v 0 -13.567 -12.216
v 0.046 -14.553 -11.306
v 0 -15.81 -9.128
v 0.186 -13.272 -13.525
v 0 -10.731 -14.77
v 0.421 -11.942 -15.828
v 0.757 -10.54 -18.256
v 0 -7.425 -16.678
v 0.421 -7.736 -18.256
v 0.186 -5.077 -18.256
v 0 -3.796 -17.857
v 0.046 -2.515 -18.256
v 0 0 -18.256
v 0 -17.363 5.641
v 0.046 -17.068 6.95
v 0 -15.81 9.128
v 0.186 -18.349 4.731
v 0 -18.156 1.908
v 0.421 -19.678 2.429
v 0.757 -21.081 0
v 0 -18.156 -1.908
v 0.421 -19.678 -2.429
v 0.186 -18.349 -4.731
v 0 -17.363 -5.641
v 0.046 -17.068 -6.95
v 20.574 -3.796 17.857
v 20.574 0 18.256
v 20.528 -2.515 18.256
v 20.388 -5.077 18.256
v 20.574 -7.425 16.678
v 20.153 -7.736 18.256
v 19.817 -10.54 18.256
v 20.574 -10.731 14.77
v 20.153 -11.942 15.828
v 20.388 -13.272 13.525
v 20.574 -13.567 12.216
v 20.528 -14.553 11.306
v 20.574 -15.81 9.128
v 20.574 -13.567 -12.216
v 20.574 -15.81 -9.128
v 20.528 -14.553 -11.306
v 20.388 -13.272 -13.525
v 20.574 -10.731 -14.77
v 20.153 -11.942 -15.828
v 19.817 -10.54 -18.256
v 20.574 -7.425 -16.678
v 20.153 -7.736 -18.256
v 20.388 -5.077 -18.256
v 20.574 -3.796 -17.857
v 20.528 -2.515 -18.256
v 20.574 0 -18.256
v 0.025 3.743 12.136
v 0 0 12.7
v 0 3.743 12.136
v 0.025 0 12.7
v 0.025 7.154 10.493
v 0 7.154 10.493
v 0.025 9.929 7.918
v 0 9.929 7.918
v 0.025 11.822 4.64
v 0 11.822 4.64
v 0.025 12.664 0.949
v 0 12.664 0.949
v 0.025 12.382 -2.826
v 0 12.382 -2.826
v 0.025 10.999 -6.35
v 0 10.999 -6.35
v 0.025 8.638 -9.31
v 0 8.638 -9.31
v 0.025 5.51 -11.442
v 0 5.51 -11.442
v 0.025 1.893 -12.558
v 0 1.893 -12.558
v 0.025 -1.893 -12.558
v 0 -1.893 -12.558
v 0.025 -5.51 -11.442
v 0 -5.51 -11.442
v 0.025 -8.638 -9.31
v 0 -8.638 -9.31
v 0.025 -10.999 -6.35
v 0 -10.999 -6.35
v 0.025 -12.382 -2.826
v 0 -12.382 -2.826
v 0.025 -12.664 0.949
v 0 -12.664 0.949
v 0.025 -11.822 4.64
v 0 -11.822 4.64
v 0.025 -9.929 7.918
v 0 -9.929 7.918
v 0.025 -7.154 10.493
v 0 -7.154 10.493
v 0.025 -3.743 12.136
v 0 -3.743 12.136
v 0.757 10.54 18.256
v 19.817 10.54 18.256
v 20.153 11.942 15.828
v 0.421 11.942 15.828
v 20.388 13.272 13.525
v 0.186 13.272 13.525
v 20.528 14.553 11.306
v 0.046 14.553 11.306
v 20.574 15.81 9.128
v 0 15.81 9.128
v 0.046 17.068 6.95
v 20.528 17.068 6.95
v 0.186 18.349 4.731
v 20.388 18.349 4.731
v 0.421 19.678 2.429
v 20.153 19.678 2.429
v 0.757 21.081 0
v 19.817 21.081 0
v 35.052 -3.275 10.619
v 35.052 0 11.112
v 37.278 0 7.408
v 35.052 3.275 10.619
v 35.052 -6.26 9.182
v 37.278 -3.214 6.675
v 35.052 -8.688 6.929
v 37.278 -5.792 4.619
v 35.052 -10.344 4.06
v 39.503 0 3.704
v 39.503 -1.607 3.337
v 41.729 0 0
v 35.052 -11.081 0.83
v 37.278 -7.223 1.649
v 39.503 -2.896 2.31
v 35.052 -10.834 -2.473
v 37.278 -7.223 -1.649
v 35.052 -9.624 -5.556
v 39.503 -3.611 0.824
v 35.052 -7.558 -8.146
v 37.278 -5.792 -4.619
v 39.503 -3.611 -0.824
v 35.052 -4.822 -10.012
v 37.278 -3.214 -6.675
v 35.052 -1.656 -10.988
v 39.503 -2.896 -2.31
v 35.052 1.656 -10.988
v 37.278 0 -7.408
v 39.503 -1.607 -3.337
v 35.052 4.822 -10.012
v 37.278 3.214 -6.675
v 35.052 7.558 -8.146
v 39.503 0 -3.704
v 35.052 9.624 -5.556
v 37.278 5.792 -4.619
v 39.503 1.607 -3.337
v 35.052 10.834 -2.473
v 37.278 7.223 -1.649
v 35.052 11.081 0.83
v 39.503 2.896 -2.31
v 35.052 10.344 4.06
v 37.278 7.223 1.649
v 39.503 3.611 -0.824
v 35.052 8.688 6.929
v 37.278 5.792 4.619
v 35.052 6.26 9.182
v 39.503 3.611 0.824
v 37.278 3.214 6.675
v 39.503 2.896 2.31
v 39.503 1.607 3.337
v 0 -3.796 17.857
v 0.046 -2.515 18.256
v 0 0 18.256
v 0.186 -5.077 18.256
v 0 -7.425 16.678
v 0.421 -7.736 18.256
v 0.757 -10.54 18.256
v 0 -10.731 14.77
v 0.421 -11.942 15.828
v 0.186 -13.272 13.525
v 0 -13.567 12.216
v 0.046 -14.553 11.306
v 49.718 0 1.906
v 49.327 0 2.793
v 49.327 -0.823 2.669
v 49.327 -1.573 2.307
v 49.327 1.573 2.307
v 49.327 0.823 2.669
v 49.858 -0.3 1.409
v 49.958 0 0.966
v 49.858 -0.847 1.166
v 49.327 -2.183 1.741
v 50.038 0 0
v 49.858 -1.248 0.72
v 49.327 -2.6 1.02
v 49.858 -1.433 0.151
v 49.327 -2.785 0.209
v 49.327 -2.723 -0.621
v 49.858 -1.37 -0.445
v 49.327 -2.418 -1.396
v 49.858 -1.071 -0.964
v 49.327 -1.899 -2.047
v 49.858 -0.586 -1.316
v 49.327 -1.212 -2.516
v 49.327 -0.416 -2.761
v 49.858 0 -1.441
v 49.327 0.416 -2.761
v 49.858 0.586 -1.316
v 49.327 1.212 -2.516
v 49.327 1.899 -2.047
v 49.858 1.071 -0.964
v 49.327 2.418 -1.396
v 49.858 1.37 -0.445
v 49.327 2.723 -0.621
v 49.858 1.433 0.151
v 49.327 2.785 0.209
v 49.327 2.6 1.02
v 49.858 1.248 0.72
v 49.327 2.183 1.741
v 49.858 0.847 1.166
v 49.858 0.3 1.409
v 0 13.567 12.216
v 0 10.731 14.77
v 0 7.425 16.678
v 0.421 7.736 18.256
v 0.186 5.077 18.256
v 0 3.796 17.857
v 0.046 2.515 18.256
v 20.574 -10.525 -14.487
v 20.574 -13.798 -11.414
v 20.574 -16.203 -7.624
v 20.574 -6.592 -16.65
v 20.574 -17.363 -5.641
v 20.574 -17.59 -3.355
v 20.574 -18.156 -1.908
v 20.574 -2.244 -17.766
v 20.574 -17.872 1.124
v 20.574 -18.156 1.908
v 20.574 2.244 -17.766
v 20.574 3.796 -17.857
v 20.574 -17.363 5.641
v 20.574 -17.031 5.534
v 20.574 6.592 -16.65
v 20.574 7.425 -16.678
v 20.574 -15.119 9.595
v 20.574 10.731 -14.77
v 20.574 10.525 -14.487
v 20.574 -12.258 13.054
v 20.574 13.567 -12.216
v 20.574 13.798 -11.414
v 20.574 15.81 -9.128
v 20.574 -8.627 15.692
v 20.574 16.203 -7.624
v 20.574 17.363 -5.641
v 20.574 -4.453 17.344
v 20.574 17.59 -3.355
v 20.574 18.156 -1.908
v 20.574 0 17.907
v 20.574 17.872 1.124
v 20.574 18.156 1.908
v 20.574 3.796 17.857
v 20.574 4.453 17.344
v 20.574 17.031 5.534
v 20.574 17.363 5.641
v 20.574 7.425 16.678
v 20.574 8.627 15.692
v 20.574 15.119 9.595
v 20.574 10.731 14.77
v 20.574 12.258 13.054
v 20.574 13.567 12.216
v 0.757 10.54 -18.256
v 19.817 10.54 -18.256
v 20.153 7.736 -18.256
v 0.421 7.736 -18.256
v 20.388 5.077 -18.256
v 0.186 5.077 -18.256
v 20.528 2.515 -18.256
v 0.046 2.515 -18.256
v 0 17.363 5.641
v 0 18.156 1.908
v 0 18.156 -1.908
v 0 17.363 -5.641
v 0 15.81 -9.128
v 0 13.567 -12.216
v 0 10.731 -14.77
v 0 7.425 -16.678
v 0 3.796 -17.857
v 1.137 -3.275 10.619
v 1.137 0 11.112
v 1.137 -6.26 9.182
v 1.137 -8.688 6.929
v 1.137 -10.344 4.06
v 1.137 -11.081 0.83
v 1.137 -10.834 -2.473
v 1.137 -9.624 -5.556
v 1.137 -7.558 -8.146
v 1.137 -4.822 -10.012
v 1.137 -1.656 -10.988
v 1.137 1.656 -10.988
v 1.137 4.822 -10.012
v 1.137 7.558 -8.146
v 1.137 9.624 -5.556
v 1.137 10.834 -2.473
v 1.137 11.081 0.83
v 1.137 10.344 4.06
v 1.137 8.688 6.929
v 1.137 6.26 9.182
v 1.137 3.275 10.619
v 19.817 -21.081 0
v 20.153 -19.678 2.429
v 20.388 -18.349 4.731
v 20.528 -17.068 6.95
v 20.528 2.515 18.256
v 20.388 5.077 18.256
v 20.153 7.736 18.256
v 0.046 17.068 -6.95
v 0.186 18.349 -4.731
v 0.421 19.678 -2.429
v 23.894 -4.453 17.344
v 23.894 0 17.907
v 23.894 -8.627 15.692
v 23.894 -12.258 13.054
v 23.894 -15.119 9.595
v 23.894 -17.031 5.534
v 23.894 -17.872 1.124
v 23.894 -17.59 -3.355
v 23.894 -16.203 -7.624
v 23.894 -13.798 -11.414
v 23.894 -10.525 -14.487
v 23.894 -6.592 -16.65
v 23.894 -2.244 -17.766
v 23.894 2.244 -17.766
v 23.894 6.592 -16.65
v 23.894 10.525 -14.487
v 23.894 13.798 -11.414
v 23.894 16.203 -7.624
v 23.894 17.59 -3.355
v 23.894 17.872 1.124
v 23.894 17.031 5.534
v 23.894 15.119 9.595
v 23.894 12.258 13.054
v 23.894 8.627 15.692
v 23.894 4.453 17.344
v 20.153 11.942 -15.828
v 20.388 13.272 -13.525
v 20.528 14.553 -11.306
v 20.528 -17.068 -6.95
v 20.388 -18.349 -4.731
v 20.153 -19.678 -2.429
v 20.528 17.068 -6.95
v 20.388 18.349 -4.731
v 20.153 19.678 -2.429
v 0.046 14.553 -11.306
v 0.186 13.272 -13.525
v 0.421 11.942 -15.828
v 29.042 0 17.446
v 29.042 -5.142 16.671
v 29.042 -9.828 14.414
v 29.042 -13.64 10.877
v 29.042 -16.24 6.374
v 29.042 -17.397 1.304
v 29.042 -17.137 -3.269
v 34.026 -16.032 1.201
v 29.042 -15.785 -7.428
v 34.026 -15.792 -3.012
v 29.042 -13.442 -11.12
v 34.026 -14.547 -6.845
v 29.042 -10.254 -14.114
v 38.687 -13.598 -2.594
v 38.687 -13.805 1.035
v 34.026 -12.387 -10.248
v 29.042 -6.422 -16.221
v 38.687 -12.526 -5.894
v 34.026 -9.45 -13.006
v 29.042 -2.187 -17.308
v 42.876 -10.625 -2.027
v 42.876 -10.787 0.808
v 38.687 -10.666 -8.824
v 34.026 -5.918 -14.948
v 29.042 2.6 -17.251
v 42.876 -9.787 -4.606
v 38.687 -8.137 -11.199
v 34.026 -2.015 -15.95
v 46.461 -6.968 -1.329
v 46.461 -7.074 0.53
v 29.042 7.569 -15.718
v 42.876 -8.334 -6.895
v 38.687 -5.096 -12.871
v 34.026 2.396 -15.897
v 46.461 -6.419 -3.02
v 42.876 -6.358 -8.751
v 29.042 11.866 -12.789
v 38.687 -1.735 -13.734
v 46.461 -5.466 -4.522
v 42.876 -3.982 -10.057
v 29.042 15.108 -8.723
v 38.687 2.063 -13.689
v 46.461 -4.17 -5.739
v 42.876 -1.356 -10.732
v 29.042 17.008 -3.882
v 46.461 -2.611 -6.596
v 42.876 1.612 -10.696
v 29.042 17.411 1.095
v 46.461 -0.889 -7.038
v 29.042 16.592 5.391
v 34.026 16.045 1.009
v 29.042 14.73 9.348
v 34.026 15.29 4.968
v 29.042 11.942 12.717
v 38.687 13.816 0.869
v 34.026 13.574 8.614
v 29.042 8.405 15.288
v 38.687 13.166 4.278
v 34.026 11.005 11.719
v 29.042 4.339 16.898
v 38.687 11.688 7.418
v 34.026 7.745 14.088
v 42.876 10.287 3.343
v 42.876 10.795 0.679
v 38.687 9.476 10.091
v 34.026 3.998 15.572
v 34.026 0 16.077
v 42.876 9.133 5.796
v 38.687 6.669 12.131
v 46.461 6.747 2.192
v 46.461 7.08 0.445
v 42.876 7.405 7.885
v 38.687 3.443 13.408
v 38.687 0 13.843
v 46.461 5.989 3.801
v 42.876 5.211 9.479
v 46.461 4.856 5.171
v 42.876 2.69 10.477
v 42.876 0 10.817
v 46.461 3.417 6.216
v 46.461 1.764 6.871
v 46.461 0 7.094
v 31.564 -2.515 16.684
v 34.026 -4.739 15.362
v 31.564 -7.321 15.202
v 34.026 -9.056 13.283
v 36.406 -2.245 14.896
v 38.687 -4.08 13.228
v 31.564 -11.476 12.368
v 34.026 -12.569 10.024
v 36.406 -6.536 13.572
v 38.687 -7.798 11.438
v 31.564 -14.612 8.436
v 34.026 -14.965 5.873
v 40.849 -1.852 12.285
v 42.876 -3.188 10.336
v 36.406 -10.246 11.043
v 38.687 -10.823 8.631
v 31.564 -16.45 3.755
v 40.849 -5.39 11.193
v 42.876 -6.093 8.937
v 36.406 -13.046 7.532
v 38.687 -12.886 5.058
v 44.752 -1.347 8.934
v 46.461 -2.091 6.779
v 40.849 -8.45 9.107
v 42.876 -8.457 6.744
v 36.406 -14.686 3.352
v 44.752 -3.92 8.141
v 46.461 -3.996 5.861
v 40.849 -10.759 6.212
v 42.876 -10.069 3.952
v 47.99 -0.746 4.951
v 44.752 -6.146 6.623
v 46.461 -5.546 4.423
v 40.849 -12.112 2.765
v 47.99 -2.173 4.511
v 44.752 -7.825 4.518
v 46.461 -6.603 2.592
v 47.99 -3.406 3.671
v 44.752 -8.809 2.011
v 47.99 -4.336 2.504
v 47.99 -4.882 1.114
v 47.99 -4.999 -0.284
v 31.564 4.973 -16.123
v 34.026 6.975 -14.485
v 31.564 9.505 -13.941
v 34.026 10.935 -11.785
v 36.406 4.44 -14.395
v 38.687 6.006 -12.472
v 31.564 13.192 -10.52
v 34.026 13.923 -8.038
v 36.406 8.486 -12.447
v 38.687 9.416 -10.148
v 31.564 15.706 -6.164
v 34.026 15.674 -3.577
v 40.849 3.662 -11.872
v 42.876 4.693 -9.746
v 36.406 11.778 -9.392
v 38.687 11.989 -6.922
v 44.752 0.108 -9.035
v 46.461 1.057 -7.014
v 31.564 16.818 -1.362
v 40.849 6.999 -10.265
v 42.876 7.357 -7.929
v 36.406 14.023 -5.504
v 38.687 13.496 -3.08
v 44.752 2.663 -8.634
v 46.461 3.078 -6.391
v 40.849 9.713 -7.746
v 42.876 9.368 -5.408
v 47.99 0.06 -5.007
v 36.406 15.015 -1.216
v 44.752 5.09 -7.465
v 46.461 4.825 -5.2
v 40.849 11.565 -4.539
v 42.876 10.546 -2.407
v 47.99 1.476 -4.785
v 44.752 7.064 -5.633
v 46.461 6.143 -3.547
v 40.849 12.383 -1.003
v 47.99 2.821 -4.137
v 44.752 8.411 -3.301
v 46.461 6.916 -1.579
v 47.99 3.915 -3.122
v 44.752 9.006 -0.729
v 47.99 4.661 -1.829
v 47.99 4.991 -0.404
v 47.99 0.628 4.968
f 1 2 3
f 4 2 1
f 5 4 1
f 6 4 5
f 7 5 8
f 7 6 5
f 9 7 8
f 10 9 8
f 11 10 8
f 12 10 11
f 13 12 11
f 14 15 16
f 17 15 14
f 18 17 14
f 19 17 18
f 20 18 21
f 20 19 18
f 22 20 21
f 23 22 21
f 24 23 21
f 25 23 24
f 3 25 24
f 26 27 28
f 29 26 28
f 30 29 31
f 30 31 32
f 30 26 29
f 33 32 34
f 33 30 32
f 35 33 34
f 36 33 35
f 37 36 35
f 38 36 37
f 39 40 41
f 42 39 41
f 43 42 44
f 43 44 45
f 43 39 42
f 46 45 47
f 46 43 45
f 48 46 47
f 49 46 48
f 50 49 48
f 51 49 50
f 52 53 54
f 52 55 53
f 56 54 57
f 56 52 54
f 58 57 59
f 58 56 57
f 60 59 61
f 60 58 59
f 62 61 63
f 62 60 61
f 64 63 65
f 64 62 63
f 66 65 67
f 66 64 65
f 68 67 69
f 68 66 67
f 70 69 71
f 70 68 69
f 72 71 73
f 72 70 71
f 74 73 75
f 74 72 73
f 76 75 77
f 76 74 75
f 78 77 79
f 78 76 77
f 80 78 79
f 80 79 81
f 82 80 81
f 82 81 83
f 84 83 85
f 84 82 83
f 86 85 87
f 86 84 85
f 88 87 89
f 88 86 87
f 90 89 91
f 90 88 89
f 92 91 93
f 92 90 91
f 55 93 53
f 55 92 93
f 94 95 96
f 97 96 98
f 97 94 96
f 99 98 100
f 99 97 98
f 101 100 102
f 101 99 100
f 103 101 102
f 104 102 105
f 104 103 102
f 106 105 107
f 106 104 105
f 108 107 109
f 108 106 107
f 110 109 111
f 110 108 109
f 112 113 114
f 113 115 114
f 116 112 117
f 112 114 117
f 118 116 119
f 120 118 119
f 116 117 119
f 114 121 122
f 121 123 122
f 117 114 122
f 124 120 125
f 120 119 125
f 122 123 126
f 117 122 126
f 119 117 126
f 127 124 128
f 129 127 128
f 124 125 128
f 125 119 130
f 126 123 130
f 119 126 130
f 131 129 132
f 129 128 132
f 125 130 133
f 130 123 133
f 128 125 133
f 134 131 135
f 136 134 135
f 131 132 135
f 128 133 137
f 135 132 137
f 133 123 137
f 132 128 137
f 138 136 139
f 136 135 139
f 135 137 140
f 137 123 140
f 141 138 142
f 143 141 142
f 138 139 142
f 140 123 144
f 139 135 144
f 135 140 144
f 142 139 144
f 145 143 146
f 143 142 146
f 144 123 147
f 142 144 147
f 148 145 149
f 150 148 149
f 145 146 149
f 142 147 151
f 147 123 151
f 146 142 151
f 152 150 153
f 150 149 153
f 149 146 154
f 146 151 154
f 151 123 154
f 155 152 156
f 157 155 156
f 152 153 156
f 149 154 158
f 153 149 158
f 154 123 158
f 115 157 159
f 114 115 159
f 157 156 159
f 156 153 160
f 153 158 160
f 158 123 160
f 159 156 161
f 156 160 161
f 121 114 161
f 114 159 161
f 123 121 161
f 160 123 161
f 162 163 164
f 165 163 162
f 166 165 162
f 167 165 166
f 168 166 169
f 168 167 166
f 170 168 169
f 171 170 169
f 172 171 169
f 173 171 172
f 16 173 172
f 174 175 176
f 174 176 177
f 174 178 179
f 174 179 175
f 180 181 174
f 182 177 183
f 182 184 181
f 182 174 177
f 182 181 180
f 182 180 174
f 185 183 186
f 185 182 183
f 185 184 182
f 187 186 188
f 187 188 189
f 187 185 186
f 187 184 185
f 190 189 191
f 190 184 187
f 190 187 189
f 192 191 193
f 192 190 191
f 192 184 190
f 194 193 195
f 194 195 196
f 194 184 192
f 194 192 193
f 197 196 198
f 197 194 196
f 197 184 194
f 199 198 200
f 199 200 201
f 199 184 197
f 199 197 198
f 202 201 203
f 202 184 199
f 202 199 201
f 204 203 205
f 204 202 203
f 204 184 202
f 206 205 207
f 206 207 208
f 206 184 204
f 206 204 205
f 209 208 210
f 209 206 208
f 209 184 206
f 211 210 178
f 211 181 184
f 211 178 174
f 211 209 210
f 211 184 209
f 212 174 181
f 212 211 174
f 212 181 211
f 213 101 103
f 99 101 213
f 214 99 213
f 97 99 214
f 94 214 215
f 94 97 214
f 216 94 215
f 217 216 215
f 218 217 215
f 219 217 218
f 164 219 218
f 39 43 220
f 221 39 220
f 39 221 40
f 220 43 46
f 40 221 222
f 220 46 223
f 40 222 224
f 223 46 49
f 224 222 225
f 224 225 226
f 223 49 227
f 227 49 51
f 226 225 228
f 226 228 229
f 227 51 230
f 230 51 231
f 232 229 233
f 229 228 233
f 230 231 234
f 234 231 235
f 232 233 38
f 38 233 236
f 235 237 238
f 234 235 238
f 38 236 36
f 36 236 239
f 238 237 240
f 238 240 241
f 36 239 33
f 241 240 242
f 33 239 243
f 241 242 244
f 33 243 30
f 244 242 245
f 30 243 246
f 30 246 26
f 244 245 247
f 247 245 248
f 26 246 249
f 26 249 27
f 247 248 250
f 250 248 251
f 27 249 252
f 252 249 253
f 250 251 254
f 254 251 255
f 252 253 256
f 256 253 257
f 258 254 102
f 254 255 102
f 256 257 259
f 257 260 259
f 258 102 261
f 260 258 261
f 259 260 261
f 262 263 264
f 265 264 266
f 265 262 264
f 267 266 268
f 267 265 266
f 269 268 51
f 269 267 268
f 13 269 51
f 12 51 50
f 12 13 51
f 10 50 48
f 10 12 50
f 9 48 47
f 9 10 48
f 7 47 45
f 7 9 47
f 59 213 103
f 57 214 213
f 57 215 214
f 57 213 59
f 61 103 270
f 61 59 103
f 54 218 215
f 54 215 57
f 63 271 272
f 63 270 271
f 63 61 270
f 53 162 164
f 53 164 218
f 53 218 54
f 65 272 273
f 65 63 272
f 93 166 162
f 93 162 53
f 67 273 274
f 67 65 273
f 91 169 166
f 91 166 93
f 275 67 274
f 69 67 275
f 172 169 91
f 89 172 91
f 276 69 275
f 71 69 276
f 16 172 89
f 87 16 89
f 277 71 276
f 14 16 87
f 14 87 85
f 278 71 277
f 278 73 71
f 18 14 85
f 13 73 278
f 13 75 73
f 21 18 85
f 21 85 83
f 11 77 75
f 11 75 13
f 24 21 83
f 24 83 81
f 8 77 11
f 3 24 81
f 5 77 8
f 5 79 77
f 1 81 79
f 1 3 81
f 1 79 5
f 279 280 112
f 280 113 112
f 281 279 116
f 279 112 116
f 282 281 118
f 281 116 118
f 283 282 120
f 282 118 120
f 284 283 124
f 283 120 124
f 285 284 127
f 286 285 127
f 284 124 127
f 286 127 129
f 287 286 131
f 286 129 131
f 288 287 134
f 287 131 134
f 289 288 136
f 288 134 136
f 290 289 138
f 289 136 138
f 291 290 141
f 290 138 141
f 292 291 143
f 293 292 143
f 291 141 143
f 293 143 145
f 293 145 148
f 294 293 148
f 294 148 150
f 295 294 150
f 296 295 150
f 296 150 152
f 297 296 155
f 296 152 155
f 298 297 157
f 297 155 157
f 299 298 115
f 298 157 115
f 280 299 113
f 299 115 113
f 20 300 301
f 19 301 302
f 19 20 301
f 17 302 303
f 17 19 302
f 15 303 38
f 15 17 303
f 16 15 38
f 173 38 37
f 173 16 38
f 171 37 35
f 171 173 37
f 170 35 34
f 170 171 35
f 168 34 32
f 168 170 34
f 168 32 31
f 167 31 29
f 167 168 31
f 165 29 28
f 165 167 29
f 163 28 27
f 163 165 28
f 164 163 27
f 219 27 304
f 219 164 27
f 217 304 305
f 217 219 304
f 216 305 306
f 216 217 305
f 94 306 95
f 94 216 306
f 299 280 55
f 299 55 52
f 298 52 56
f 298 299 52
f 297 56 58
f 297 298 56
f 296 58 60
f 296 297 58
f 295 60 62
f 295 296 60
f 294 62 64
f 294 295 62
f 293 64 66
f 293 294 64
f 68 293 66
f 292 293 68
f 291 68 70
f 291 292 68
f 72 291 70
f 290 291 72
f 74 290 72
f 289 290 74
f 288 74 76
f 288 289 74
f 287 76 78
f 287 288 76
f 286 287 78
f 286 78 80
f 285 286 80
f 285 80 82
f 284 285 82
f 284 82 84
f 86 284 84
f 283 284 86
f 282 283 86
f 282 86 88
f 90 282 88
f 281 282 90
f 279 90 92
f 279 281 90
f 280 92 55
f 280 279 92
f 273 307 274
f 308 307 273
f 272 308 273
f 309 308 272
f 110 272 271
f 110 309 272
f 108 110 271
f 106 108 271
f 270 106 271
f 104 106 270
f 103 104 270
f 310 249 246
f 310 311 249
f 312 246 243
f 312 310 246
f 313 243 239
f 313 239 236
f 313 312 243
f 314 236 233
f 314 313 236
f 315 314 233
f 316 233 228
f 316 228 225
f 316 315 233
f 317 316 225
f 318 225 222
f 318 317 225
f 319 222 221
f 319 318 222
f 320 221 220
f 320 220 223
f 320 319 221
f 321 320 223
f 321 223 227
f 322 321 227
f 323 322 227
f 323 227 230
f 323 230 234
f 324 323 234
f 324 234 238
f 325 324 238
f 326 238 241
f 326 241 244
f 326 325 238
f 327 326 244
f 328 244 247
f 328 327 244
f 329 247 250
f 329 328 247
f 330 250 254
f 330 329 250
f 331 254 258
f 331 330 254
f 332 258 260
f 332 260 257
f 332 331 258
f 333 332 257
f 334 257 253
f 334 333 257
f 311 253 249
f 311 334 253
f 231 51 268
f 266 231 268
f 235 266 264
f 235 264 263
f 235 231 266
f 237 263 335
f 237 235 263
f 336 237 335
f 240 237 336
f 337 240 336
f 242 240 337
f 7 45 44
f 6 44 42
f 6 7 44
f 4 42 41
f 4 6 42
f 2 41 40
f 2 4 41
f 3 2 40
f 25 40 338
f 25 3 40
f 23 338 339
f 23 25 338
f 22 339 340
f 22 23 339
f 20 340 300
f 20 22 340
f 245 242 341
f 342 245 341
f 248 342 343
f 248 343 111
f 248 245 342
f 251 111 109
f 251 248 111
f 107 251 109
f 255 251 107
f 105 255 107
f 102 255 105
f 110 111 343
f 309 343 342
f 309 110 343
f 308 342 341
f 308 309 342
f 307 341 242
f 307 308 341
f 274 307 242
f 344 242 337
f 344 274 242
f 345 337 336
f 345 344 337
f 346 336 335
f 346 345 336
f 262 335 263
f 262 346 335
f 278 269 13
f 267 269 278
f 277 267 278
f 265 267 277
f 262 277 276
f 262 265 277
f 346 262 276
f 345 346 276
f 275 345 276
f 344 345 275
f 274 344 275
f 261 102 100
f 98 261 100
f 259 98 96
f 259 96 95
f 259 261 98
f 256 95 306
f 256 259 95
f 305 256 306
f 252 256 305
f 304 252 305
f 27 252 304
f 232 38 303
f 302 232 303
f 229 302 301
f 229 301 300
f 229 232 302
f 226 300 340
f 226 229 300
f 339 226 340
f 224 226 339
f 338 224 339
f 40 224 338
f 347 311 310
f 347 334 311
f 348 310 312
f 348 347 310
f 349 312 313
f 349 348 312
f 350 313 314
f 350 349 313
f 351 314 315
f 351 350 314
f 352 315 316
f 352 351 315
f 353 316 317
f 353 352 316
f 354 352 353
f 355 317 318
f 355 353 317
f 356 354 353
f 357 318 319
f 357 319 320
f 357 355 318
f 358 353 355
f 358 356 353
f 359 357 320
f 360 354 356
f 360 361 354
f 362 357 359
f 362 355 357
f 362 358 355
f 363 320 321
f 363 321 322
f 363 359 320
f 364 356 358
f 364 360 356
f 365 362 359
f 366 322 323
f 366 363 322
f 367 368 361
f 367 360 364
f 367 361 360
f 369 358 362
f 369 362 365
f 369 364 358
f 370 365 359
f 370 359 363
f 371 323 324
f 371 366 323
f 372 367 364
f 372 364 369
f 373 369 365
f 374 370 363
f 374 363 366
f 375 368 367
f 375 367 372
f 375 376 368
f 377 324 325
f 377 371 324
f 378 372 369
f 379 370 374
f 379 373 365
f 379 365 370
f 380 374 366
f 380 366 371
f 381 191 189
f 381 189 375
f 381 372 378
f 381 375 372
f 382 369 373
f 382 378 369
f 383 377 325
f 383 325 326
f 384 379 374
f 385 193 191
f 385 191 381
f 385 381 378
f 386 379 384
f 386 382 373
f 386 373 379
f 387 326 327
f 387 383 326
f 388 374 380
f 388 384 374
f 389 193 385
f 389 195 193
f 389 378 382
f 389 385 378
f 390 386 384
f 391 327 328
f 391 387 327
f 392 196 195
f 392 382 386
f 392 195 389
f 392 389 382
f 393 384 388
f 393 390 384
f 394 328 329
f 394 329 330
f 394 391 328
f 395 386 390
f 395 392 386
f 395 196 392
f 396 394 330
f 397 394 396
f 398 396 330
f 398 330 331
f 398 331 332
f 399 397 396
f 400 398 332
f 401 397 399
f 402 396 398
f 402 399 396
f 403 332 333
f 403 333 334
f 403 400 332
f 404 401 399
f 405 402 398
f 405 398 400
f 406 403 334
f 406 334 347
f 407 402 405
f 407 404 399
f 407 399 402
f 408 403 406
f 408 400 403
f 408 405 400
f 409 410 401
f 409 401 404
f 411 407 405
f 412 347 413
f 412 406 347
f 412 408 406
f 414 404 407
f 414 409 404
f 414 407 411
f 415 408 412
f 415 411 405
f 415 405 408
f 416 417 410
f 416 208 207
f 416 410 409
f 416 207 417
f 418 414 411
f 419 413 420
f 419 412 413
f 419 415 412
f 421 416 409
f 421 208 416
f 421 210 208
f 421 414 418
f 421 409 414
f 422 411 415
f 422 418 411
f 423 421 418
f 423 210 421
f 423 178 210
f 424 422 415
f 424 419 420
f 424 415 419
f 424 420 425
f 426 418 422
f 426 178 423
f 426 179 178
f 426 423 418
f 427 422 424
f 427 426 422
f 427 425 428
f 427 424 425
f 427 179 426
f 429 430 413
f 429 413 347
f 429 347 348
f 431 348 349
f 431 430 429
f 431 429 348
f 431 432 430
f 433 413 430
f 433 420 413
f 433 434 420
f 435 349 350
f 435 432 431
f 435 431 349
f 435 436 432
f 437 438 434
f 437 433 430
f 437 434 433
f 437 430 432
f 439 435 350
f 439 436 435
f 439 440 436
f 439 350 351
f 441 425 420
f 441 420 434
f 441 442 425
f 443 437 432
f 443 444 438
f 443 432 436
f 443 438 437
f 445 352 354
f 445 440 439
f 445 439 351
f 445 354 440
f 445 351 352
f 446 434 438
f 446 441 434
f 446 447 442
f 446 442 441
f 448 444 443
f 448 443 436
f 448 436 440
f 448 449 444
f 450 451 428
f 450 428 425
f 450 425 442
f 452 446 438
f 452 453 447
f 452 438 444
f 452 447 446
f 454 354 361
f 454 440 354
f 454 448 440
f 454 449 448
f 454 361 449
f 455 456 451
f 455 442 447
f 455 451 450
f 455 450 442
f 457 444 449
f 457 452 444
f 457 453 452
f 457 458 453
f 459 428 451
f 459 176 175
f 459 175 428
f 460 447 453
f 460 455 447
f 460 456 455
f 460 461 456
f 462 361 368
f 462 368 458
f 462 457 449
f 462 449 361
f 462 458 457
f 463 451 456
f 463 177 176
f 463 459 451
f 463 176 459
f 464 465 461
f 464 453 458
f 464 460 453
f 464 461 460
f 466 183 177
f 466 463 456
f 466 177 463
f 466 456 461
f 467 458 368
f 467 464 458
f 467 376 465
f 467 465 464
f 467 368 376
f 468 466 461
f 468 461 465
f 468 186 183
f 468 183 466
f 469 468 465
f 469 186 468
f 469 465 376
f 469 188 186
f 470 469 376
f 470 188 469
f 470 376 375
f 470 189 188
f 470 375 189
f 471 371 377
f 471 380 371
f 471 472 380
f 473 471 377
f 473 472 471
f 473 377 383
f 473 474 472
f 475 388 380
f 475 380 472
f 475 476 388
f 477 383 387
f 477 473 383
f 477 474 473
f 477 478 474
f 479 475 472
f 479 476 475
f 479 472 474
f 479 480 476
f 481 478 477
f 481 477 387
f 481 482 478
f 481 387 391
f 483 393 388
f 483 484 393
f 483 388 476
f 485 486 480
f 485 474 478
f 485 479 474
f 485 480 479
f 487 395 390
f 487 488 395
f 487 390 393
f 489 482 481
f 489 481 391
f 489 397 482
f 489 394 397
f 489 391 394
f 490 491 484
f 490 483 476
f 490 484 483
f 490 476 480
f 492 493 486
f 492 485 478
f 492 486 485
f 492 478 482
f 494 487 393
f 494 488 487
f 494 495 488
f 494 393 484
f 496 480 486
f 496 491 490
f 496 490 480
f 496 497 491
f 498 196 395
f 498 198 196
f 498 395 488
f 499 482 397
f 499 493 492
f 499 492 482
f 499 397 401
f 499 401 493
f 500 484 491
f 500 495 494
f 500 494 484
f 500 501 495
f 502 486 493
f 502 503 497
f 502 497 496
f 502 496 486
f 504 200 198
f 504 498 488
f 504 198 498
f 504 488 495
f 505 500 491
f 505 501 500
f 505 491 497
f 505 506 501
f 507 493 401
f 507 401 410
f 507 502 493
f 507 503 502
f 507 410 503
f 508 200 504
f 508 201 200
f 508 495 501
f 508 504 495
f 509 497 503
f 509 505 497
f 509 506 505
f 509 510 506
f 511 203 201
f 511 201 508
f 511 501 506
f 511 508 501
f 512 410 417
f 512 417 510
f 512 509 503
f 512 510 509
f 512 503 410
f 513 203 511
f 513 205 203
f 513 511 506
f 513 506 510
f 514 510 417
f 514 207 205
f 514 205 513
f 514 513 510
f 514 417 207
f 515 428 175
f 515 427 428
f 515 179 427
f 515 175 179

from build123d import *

# Parameters (mm, degrees)
BASENUT_DEPTH = 20.574


with BuildPart() as part:
    # BaseNutSke → BaseNut (new body)
    with BuildSketch(Plane(origin=(0, 0, 0), x_dir=(0, 0, -1), z_dir=(1, 0, 0))):
        Polygon((18.25625, 10.540250852), (18.25625, -10.540250852), (0, -21.080501704), (-18.25625, -10.540250852), (-18.25625, 10.540250852), (0, 21.080501704), align=None)
    extrude(amount=BASENUT_DEPTH)

    # Sketch3 → Crown (revolve)
    with BuildSketch(Plane.XY, mode=Mode.PRIVATE) as crown_sk:
        with BuildLine():
            Line((50.038, 0), (0, 0))
            Line((0, 0), (0, 17.907))
            Line((0, 17.907), (23.89386723, 17.907))
            ThreePointArc((23.89386723, 17.907), (38.686643155, 13.843242093), (49.327308282, 2.792604396))
            ThreePointArc((49.327308282, 2.792604396), (49.857539852, 1.440808977), (50.038, 0))
        make_face()
    revolve(crown_sk.sketch.rotate(Axis((0, 0, 0), (1, 0, 0)), 90), axis=Axis((0, 0, 0), (1, 0, 0)))

    # Sketch4 → DoubleChamfer (revolve, cut)
    with BuildSketch(Plane.XY, mode=Mode.PRIVATE) as doublechamfer_sk:
        Polygon((0, 18.25625), (1.949893068, 25.53335), (18.624460993, 25.53335), (20.574, 18.25625), (33.274, 18.25625), (33.274, 43.65625), (-12.7, 43.65625), (-12.7, 18.25625), align=None)
    revolve(doublechamfer_sk.sketch.rotate(Axis((0, 0, 0), (1, 0, 0)), 90), axis=Axis((0, 0, 0), (1, 0, 0)), mode=Mode.SUBTRACT)

    # Sketch5 → TapDrill (revolve, cut)
    with BuildSketch(Plane.XY, mode=Mode.PRIVATE) as tapdrill_sk:
        Polygon((0, 11.1125), (35.052, 11.1125), (41.729063629, 0), (0, 0), align=None)
    revolve(tapdrill_sk.sketch.rotate(Axis((0, 0, 0), (1, 0, 0)), 90), axis=Axis((0, 0, 0), (1, 0, 0)), mode=Mode.SUBTRACT)

    # EndChamferSketch → EndChamfer (revolve, cut)
    with BuildSketch(Plane.XY, mode=Mode.PRIVATE) as endchamfer_sk:
        Polygon((-0.0254, 12.7), (0.0254, 12.7), (1.248137414, 10.95375), (-0.0254, 10.95375), align=None)
    revolve(endchamfer_sk.sketch.rotate(Axis((-3.175, 0, 0), (-1, 0, 0)), 270), axis=Axis((-3.175, 0, 0), (-1, 0, 0)), mode=Mode.SUBTRACT)


solid = part.part
